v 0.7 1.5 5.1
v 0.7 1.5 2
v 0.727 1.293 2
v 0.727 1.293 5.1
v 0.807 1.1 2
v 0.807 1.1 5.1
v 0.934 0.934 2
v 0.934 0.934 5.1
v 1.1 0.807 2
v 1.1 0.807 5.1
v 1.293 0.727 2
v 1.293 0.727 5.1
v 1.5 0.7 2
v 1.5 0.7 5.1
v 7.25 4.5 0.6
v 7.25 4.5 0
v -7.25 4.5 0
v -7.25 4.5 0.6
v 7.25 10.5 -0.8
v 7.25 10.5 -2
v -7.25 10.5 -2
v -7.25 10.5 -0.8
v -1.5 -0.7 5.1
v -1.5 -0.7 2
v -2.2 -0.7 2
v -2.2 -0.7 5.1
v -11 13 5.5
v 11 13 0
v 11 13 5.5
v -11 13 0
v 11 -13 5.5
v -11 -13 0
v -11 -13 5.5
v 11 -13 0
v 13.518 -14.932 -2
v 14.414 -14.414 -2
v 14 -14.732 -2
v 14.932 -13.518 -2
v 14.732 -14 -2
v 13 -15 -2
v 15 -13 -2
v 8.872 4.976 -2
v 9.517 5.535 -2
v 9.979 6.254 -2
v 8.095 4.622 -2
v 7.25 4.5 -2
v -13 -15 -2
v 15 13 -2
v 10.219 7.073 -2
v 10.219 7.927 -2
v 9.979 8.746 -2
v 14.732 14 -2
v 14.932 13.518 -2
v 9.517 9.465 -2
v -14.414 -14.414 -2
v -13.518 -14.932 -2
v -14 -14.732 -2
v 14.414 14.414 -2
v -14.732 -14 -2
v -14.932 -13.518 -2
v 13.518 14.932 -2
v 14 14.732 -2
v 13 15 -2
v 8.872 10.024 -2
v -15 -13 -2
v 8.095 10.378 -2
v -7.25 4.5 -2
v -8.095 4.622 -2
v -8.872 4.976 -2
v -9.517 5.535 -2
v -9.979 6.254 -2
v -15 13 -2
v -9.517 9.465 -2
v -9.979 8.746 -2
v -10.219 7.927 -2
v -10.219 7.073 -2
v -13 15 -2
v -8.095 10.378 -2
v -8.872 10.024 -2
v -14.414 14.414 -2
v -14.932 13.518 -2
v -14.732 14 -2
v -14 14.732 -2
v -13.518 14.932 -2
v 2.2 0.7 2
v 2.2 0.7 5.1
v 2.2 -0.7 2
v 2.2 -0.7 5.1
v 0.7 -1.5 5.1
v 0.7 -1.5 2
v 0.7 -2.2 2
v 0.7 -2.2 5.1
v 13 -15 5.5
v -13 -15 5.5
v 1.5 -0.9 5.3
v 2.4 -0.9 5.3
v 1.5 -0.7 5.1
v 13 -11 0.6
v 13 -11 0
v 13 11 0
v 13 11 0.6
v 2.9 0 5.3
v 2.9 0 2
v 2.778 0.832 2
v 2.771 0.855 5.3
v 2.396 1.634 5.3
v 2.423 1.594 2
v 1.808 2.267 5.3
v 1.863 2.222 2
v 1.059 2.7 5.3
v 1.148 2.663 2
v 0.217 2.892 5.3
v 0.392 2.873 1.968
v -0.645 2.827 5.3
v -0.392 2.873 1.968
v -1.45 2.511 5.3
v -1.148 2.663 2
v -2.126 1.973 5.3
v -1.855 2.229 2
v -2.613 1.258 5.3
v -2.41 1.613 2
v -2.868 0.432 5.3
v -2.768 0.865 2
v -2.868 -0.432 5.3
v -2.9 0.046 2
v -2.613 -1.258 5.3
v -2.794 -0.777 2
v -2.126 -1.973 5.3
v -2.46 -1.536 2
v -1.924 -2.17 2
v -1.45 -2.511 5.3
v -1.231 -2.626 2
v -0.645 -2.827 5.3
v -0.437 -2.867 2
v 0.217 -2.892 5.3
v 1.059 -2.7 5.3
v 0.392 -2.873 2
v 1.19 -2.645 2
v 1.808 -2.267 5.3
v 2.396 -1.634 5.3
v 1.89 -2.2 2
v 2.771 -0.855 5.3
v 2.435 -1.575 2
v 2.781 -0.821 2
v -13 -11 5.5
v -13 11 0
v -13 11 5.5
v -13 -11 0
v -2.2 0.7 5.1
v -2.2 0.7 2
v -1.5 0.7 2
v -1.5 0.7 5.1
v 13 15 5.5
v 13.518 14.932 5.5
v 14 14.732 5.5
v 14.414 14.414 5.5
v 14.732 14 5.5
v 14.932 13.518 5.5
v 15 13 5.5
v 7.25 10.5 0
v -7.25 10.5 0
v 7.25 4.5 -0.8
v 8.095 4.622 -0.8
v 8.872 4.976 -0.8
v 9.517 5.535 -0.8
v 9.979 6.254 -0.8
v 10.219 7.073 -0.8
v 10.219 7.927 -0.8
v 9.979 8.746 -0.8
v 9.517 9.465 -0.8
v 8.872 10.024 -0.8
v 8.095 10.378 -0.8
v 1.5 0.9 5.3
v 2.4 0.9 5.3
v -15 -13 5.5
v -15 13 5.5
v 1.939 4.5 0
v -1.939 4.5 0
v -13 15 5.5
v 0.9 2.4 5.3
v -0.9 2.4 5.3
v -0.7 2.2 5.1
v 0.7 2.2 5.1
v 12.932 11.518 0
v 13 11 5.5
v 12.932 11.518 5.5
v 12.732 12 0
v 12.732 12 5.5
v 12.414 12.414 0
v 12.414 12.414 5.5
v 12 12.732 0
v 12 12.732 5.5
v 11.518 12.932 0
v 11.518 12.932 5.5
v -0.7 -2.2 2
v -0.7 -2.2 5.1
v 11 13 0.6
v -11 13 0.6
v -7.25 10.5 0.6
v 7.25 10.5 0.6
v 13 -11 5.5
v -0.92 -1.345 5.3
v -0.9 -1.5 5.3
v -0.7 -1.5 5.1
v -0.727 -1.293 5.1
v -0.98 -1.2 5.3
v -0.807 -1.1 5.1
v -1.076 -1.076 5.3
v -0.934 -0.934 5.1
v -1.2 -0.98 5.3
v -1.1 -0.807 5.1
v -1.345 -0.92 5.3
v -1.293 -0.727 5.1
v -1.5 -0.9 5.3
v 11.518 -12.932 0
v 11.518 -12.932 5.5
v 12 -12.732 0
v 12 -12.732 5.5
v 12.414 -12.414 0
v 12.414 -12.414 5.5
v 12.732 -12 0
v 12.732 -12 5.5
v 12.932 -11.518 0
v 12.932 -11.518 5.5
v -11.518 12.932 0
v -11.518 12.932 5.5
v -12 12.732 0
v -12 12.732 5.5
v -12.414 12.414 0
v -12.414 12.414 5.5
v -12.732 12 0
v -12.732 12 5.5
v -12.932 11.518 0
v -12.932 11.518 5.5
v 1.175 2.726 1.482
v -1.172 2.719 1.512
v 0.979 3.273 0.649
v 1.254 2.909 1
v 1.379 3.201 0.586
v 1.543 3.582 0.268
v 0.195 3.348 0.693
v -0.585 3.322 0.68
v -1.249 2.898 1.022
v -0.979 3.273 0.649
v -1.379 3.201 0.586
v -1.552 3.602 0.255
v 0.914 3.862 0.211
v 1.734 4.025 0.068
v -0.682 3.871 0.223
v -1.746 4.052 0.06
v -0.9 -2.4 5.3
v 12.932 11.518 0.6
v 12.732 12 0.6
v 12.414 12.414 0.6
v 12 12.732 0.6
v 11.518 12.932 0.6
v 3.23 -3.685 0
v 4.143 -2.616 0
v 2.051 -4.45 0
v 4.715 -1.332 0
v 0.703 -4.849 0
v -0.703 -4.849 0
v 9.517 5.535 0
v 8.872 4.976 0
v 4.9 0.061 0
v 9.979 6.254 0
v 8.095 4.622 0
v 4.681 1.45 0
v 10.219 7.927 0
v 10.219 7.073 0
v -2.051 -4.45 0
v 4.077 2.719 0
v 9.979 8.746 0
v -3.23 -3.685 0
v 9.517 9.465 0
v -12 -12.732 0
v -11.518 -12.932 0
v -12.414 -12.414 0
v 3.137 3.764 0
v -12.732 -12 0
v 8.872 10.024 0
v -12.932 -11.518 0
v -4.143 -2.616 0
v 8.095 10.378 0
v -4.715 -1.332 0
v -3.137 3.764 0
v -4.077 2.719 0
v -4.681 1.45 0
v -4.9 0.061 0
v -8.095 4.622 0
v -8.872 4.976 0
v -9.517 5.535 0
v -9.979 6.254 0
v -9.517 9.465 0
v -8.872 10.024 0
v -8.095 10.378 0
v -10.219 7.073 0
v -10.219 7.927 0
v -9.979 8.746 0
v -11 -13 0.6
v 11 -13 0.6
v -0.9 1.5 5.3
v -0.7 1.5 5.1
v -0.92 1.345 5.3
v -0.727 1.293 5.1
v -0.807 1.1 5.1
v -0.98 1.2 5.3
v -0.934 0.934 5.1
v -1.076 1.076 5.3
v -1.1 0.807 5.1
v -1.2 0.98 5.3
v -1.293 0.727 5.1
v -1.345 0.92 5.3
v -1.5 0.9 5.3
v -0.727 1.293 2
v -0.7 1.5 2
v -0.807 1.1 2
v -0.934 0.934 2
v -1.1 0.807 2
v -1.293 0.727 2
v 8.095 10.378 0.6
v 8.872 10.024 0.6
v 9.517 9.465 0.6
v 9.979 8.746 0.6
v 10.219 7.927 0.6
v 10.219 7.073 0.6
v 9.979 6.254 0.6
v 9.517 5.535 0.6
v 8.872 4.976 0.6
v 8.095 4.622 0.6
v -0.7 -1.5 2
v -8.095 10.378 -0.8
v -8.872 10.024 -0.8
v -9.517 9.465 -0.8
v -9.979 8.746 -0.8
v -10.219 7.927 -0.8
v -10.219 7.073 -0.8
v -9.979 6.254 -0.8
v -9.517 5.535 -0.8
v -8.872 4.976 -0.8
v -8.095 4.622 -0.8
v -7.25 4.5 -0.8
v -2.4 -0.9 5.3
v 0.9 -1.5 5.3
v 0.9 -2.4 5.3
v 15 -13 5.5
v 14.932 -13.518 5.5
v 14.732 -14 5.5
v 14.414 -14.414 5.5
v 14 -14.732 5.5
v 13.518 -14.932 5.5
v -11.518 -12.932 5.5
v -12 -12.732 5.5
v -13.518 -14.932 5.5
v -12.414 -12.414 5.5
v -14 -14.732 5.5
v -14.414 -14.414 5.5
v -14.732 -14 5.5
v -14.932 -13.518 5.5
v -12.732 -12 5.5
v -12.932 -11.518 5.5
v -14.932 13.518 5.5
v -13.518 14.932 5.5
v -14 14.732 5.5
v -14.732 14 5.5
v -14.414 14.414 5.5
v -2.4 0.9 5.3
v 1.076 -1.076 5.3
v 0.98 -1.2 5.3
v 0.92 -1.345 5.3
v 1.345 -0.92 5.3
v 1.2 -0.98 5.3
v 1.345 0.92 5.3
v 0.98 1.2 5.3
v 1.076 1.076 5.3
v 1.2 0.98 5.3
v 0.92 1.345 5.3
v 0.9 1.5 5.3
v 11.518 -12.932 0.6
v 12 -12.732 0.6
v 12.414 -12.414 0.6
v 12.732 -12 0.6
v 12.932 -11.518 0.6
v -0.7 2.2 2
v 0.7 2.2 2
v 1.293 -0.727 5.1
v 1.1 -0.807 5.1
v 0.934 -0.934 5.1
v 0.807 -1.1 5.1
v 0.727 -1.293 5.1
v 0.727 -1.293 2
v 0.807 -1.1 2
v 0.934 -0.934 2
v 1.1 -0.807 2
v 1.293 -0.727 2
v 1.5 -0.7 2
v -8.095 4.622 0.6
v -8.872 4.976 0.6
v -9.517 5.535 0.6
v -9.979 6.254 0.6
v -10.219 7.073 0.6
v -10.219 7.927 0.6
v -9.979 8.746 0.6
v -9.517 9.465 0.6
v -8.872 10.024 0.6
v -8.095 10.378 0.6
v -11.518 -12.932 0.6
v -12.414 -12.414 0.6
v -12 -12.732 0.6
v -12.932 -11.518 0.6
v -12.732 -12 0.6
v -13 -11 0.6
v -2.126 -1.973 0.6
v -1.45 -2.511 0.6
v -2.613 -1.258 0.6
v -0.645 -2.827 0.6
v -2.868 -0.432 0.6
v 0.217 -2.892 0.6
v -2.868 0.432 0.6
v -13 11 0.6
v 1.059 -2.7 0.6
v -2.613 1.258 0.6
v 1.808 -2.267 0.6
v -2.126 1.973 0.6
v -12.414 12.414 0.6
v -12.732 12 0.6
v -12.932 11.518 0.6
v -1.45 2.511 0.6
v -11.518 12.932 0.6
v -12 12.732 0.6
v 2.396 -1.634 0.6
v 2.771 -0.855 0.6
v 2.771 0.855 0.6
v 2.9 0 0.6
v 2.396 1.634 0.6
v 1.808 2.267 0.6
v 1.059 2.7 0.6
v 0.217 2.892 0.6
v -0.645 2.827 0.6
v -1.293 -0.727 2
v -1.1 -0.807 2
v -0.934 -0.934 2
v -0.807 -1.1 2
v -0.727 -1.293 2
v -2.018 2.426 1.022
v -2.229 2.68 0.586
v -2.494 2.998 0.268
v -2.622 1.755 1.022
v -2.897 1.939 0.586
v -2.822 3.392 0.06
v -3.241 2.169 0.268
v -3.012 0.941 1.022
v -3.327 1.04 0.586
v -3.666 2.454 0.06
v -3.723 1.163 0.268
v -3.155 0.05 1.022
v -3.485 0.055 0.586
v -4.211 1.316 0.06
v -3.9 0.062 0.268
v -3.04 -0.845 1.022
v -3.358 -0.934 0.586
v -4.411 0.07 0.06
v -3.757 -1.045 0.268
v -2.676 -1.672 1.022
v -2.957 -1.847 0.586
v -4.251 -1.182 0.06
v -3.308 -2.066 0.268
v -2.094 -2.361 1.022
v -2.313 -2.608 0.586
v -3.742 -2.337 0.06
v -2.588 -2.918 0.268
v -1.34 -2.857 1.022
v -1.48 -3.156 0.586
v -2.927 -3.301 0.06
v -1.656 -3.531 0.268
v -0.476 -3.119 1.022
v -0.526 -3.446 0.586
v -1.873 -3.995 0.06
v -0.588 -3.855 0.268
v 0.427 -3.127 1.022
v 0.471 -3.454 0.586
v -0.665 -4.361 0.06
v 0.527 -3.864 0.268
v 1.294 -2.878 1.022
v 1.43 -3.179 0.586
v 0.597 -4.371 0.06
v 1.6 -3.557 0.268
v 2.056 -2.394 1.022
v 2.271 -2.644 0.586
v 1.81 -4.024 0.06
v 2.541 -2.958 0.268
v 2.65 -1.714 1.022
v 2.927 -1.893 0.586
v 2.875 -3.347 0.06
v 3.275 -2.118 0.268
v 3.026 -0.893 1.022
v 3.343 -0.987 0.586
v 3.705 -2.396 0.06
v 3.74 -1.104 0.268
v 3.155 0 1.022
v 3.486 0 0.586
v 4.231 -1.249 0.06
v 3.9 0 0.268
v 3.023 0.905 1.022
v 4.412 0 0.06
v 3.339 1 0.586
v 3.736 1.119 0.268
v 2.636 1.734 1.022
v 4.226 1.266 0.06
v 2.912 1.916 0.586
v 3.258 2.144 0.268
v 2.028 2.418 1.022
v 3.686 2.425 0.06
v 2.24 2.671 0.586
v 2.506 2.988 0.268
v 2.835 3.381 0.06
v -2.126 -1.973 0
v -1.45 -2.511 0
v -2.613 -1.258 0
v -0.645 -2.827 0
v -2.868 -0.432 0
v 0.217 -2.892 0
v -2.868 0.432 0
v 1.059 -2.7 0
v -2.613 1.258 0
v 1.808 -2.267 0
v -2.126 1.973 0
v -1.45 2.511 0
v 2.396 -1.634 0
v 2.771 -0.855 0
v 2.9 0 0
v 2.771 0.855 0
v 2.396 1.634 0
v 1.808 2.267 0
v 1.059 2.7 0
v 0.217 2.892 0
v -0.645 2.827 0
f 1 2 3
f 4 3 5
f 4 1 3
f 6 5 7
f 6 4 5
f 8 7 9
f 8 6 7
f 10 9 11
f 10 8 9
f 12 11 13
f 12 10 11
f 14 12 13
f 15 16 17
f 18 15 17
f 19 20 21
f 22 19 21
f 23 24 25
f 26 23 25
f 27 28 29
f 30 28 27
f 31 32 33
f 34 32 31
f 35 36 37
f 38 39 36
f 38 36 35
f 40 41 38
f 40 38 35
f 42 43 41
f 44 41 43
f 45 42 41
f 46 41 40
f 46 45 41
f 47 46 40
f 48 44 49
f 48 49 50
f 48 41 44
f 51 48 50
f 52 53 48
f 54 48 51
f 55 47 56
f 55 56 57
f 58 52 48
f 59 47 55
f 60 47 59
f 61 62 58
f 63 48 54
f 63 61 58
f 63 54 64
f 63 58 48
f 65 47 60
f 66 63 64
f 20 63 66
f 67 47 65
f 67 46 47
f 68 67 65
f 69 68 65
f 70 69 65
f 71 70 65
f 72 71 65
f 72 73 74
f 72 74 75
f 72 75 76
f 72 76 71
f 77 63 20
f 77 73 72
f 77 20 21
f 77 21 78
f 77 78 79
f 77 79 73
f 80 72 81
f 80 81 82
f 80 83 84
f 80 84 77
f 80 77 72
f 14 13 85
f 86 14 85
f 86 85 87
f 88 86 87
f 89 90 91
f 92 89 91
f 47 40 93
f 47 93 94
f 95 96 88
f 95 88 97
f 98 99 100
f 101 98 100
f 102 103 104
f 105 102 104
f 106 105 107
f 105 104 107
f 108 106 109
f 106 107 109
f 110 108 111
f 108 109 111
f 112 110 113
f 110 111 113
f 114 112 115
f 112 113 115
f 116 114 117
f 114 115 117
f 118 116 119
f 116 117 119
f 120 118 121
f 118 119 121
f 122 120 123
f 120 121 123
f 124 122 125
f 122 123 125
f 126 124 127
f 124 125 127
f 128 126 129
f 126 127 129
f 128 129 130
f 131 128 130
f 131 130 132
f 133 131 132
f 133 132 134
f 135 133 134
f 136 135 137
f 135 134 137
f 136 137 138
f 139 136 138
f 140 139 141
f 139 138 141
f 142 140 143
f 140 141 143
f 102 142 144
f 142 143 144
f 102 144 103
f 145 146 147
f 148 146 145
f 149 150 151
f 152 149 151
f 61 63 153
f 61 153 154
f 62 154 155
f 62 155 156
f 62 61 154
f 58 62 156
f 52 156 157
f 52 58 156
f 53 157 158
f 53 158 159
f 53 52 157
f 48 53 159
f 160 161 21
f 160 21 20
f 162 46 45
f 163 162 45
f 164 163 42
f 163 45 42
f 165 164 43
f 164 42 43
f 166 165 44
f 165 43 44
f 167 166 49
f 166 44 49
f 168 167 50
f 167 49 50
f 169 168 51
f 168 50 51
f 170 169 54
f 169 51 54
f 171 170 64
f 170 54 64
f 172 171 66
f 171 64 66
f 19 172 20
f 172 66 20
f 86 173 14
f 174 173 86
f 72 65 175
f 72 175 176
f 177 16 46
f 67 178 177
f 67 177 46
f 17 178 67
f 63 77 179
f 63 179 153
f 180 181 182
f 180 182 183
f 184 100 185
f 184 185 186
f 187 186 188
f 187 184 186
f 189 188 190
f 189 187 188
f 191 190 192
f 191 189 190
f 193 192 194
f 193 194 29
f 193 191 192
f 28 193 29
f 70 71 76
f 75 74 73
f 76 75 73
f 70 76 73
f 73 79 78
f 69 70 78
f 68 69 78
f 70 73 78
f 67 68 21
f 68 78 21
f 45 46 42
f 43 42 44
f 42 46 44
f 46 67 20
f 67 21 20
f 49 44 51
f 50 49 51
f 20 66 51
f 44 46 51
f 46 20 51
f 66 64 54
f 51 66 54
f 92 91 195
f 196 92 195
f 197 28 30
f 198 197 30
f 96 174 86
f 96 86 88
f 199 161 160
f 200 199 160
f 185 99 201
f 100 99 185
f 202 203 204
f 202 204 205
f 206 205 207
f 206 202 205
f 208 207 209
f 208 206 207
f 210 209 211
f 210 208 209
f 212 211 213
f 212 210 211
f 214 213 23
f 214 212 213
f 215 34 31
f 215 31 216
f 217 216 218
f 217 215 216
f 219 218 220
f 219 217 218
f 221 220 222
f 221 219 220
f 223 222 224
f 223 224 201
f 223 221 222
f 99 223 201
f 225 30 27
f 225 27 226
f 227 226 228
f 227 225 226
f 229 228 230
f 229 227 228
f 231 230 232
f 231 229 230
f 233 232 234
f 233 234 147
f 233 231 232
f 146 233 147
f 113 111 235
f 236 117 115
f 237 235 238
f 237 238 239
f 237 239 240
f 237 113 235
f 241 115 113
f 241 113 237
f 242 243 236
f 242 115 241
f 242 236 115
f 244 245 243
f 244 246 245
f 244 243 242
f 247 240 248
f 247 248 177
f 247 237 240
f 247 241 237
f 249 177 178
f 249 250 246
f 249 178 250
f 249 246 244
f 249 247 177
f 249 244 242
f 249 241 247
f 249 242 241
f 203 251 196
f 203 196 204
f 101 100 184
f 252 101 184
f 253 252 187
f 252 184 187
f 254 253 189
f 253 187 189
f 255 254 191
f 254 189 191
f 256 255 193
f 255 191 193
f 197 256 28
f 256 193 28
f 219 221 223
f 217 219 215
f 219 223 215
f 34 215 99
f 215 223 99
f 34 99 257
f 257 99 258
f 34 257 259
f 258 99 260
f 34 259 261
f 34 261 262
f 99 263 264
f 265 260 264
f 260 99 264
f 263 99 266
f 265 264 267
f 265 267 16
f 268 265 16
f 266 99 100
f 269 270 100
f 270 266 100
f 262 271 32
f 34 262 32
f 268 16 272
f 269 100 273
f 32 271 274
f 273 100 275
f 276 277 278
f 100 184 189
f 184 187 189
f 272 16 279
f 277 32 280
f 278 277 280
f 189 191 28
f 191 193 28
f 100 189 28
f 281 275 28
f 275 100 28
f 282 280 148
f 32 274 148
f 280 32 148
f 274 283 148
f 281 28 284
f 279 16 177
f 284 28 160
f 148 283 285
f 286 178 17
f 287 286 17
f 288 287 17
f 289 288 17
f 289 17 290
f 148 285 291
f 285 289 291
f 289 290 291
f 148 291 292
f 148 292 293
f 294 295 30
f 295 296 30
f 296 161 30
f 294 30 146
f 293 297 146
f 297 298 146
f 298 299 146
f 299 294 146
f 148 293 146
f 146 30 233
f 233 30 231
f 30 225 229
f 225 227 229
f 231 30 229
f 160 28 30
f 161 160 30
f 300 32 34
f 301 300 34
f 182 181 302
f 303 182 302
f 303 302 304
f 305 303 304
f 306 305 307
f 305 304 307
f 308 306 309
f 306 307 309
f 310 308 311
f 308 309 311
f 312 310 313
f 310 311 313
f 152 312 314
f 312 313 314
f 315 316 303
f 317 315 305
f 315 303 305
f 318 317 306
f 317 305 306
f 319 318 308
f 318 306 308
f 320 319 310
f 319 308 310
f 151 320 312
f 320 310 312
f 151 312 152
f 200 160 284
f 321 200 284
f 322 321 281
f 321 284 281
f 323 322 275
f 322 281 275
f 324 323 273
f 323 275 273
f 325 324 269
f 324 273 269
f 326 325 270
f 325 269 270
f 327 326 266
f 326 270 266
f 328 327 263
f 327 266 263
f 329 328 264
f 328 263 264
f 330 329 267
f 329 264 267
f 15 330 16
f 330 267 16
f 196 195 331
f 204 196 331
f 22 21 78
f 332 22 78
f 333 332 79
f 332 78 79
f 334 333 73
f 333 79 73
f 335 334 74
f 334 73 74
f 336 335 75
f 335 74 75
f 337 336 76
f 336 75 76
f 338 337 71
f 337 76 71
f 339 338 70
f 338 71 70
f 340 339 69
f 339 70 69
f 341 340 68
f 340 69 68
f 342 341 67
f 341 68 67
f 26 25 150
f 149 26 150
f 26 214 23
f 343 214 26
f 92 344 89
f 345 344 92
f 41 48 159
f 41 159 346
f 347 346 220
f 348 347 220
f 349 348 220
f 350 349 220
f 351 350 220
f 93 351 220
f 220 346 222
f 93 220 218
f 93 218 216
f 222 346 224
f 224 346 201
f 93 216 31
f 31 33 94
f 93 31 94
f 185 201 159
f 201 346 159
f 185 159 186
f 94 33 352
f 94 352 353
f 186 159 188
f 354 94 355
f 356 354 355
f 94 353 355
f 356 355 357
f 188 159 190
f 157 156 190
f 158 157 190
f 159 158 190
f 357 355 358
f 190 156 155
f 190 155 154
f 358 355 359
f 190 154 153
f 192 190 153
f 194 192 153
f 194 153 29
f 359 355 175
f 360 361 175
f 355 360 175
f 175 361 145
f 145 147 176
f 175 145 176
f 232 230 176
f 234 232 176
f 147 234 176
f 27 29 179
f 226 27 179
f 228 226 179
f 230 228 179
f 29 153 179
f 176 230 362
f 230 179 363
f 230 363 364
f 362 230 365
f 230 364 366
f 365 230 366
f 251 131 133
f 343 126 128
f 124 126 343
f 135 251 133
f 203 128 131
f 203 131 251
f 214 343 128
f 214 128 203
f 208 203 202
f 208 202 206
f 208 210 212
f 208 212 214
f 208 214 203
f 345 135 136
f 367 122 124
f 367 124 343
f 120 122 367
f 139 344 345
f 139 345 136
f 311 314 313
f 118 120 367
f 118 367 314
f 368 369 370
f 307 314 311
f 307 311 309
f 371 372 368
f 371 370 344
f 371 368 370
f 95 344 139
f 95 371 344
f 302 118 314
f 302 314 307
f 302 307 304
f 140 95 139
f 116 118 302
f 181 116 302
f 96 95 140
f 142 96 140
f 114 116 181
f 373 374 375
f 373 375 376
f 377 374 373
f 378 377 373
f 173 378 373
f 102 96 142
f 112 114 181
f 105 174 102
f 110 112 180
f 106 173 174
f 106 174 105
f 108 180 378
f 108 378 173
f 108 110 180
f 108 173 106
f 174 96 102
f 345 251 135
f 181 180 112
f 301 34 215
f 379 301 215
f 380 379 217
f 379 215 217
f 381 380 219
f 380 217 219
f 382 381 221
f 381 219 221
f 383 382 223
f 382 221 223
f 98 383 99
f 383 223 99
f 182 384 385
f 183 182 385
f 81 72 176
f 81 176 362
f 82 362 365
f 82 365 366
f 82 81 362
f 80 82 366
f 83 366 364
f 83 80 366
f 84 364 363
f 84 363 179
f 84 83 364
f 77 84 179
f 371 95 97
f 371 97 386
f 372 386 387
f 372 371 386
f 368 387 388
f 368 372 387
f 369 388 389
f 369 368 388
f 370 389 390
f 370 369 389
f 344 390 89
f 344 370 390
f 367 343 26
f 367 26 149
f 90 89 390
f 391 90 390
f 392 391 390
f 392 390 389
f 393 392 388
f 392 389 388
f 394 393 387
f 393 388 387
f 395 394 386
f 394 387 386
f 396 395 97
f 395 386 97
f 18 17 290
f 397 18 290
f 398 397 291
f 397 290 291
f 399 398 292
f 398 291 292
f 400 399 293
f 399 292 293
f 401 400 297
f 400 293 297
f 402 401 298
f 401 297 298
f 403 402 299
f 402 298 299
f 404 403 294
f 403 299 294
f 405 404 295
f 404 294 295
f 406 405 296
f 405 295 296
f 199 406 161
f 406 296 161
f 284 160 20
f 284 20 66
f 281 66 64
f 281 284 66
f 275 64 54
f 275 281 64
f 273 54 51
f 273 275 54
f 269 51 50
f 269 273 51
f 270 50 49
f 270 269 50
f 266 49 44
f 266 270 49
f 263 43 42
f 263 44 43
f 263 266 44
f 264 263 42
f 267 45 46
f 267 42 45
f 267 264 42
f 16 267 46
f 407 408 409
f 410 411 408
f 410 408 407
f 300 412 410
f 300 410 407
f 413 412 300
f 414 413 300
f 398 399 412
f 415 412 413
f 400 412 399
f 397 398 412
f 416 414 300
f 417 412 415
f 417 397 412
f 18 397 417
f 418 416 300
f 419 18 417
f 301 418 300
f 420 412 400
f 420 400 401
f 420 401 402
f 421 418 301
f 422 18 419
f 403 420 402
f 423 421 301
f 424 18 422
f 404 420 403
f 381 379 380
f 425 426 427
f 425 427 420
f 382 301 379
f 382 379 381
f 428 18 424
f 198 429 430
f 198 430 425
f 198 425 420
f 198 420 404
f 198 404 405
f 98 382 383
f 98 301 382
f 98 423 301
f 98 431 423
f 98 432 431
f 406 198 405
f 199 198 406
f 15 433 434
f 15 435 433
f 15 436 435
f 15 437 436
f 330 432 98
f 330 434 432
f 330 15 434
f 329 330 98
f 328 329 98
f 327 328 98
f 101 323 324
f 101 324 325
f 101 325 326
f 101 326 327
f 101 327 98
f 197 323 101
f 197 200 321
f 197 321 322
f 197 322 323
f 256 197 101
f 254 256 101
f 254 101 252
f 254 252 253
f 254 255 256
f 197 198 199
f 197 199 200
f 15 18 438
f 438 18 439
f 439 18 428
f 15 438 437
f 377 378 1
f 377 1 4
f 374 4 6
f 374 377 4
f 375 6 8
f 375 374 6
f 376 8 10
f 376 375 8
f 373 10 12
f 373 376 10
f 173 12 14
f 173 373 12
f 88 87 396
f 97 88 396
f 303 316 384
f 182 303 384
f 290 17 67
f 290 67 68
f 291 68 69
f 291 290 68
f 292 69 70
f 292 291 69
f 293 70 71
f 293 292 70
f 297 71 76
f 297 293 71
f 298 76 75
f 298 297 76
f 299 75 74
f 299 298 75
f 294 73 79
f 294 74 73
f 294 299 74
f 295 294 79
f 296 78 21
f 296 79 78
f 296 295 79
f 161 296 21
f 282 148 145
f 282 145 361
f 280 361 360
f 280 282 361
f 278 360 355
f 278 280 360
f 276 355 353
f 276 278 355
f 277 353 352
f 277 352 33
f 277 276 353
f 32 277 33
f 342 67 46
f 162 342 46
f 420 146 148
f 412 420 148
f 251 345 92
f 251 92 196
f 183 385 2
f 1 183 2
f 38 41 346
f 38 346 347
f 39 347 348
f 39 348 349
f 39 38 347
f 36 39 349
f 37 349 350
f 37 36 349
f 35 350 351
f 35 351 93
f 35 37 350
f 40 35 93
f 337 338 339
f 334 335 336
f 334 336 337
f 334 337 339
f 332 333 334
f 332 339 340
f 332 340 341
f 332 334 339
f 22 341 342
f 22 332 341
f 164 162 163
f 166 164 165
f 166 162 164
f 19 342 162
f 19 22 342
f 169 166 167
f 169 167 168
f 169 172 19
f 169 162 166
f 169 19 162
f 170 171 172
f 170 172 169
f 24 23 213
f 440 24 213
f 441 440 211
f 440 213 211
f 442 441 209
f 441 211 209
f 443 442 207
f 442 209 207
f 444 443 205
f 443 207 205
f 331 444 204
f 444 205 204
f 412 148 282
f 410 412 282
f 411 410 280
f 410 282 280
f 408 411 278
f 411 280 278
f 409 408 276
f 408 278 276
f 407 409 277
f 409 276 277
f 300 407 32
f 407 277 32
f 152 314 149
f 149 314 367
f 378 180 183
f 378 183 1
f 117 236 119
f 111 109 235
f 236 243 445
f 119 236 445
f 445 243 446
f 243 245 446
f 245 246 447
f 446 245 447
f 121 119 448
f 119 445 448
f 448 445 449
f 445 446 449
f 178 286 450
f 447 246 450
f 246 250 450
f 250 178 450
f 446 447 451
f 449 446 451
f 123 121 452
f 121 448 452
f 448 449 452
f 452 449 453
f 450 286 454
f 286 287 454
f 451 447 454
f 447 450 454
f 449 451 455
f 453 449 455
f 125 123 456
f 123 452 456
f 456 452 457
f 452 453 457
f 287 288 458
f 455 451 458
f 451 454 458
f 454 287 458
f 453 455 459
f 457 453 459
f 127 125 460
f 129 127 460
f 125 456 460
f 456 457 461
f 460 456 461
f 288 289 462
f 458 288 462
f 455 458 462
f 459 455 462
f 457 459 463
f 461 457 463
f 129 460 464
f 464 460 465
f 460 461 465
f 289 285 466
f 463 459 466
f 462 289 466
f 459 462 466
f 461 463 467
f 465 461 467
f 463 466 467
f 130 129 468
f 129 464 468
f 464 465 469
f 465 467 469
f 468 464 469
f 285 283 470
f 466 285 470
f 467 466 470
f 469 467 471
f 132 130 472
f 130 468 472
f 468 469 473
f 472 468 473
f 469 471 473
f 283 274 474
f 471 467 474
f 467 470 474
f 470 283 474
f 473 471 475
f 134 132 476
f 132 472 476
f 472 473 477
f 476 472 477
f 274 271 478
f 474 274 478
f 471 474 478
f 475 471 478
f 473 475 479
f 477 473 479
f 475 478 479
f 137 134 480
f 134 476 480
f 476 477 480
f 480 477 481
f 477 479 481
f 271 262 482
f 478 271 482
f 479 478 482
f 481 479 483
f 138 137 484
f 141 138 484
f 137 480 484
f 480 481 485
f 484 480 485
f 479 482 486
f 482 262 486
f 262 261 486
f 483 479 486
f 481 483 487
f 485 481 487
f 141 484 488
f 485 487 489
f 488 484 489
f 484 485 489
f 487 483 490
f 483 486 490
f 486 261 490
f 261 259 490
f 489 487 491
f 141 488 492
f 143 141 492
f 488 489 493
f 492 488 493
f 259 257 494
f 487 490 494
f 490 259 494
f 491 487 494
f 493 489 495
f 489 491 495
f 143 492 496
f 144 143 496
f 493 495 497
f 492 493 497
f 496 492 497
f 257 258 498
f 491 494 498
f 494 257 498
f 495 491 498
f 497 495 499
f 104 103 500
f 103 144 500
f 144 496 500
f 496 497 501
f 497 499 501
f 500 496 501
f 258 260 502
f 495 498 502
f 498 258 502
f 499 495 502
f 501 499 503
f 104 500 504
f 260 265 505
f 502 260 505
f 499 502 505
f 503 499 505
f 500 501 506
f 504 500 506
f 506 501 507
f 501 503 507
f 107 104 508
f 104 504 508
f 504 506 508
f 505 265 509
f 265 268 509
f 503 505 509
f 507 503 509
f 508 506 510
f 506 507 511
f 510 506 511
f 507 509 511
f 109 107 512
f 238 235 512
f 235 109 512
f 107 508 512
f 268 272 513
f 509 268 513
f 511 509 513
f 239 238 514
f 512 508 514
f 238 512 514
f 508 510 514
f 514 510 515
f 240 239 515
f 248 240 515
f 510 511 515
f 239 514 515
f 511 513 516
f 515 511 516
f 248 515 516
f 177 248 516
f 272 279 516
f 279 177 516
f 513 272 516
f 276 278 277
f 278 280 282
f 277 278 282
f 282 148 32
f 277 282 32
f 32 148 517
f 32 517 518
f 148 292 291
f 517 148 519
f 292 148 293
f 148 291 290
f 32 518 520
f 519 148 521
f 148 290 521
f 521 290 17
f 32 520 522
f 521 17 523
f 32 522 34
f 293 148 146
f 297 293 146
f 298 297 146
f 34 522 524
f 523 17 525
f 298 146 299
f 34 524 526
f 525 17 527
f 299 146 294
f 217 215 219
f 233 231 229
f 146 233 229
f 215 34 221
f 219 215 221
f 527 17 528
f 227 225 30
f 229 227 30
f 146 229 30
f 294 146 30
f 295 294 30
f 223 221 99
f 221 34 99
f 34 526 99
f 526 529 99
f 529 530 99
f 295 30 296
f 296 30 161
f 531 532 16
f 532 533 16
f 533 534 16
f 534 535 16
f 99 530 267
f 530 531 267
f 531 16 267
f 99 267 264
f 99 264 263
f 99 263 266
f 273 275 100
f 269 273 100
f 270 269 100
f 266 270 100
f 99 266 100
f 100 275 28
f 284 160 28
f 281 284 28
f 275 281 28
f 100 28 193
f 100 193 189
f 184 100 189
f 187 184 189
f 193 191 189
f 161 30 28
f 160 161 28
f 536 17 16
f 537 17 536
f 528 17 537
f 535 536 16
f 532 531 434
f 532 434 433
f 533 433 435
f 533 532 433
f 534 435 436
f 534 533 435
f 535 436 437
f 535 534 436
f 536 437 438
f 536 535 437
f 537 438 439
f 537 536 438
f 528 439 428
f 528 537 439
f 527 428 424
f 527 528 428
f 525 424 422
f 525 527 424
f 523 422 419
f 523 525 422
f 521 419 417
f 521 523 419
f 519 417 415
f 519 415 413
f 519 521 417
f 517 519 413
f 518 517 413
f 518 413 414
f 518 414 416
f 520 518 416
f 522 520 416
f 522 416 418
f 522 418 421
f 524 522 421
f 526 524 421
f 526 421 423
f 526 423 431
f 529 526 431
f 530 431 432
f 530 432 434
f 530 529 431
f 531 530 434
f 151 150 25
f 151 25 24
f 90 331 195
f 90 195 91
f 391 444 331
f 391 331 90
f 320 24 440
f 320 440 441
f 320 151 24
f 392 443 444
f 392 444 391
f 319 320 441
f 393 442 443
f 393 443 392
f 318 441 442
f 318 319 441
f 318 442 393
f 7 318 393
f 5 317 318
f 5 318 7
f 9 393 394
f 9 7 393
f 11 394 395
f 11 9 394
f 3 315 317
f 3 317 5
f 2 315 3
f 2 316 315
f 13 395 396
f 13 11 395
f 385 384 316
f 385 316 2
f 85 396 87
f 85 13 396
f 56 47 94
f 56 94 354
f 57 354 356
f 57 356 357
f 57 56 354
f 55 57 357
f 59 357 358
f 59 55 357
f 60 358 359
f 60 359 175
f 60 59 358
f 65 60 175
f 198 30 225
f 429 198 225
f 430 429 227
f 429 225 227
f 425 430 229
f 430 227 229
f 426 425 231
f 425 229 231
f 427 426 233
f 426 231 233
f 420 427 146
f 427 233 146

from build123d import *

# Parameters (mm, degrees)
EXTRUDE_1_DEPTH     = 5.5
SKETCH_1_6_R        = 2.9
EXTRUDE_2_DEPTH     = 5.3
EXTRUDE_START       = -2
EXTRUDE_3_DEPTH     = 2
EXTRUDE_4_DEPTH     = 2
CUT_EXTRUDE_1_REACH = 23.915
EXTRUDE_6_DEPTH     = 1.2
SKETCH_7_R          = 2.9
EXTRUDE_7_DEPTH     = 0.6
FILLET_4_R          = 0.8
CHAMFER_1_SIZE      = 0.2
FILLET_5_R          = 2


with BuildPart() as part:
    # 草图1 → 凸台-拉伸1 (new body)
    with BuildSketch(Plane.XY):
        with BuildLine():
            ThreePointArc((-15, 13), (-14.414213562, 14.414213562), (-13, 15))
            Line((-13, 15), (13, 15))
            ThreePointArc((13, 15), (14.414213562, 14.414213562), (15, 13))
            Line((15, 13), (15, -13))
            ThreePointArc((15, -13), (14.414213562, -14.414213562), (13, -15))
            Line((13, -15), (-13, -15))
            ThreePointArc((-13, -15), (-14.414213562, -14.414213562), (-15, -13))
            Line((-15, -13), (-15, 13))
        make_face()
        with BuildLine():
            ThreePointArc((-13, -11), (-12.414213562, -12.414213562), (-11, -13))
            Line((-11, -13), (11, -13))
            ThreePointArc((11, -13), (12.414213562, -12.414213562), (13, -11))
            Line((13, -11), (13, 11))
            ThreePointArc((13, 11), (12.414213562, 12.414213562), (11, 13))
            Line((11, 13), (-11, 13))
            ThreePointArc((-11, 13), (-12.414213562, 12.414213562), (-13, 11))
            Line((-13, 11), (-13, -11))
        make_face(mode=Mode.SUBTRACT)
    extrude(amount=EXTRUDE_1_DEPTH)



with BuildPart() as body_2:
    # 草图1<6> → 凸台-拉伸2 (new body)
    with BuildSketch(Plane.XY):
        Circle(SKETCH_1_6_R)
        Polygon((-2.2, -0.7), (-2.2, 0.7), (-0.7, 0.7), (-0.7, 2.2), (0.7, 2.2), (0.7, 0.7), (2.2, 0.7), (2.2, -0.7), (0.7, -0.7), (0.7, -2.2), (-0.7, -2.2), (-0.7, -0.7), align=None, mode=Mode.SUBTRACT)
    extrude(amount=EXTRUDE_2_DEPTH)


with BuildPart() as part_1:
    add(part.part)

    add(body_2.part)  # 凸台-拉伸3 merges body 2
    # 草图1<7> → 凸台-拉伸3 (add)
    with BuildSketch(Plane.XY.offset(EXTRUDE_START)):
        with BuildLine():
            Line((-13, 15), (13, 15))
            ThreePointArc((13, 15), (14.414213562, 14.414213562), (15, 13))
            Line((15, 13), (15, -13))
            ThreePointArc((15, -13), (14.414213562, -14.414213562), (13, -15))
            Line((13, -15), (-13, -15))
            ThreePointArc((-13, -15), (-14.414213562, -14.414213562), (-15, -13))
            Line((-15, -13), (-15, 13))
            ThreePointArc((-15, 13), (-14.414213562, 14.414213562), (-13, 15))
        make_face()
    extrude(amount=EXTRUDE_3_DEPTH)

    # 草图3 → 凸台-拉伸4 (add)
    with BuildSketch(Plane.XY):
        Polygon((0.7, 0.7), (0.7, 2.2), (-0.7, 2.2), (-0.7, 0.7), (-2.2, 0.7), (-2.2, -0.7), (-0.7, -0.7), (-0.7, -2.2), (0.7, -2.2), (0.7, -0.7), (2.2, -0.7), (2.2, 0.7), align=None)
    extrude(amount=EXTRUDE_4_DEPTH)

    # 草图5 → 切除-拉伸1 (cut, up to next)
    with BuildSketch(Plane.XY, mode=Mode.PRIVATE) as cut_extrude_1_sk1:
        with BuildLine():
            Line((7.25, 4.5), (-7.25, 4.5))
            ThreePointArc((-7.25, 4.5), (-10.25, 7.5), (-7.25, 10.5))
            Line((-7.25, 10.5), (7.25, 10.5))
            ThreePointArc((7.25, 10.5), (10.25, 7.5), (7.25, 4.5))
        make_face()
    cut_extrude_1_tool1 = extrude(cut_extrude_1_sk1.sketch, amount=-CUT_EXTRUDE_1_REACH, mode=Mode.PRIVATE) & part_1.part
    add(cut_extrude_1_tool1.solids().sort_by_distance((0, 7.5, 0))[0], mode=Mode.SUBTRACT)

    # 圆角4
    fillet_4_edges = [part_1.edges().sort_by_distance(p)[0] for p in [
        (0.7, 0.7, 3.65),
        (0.7, -0.7, 3.65),
        (-0.7, -0.7, 3.65),
        (-0.7, 0.7, 3.65),
    ]]
    fillet(fillet_4_edges, radius=FILLET_4_R)

    # 倒角1
    chamfer_1_edges = [part_1.edges().sort_by_distance(p)[0] for p in [
        (1.85, 0.7, 5.3),
        (1.85, -0.7, 5.3),
        (0.7, -1.85, 5.3),
        (-0.7, -1.85, 5.3),
        (0.934314575, -0.934314575, 5.3),
        (-0.934314575, -0.934314575, 5.3),
        (0.934314575, 0.934314575, 5.3),
        (-0.934314575, 0.934314575, 5.3),
        (0, -2.2, 5.3),
        (-1.85, -0.7, 5.3),
        (-2.2, 0, 5.3),
        (-0.7, 1.85, 5.3),
        (0, 2.2, 5.3),
        (0.7, 1.85, 5.3),
        (2.2, 0, 5.3),
        (-1.85, 0.7, 5.3),
    ]]
    chamfer(chamfer_1_edges, length=CHAMFER_1_SIZE)

    # 圆角5
    fillet_5_edges = [part_1.edges().sort_by_distance(p)[0] for p in [
        (-2.9, 0, 0),
    ]]
    fillet(fillet_5_edges, radius=FILLET_5_R)


with BuildPart() as body_2_2:
    # 草图6 → 凸台-拉伸6 (new body)
    with BuildSketch(Plane(origin=(0, 0, -2), x_dir=(-1, 0, 0), z_dir=(0, 0, -1))):
        with BuildLine():
            Line((7.25, 4.5), (-7.25, 4.5))
            ThreePointArc((-7.25, 4.5), (-10.25, 7.5), (-7.25, 10.5))
            Line((-7.25, 10.5), (7.25, 10.5))
            ThreePointArc((7.25, 10.5), (10.25, 7.5), (7.25, 4.5))
        make_face()
    extrude(amount=-EXTRUDE_6_DEPTH)


with BuildPart() as body_3:
    # 草图7 → 凸台-拉伸7 (new body)
    with BuildSketch(Plane.XY):
        with BuildLine():
            Line((-13, 11), (-13, -11))
            ThreePointArc((-13, -11), (-12.414213562, -12.414213562), (-11, -13))
            Line((-11, -13), (11, -13))
            ThreePointArc((11, -13), (12.414213562, -12.414213562), (13, -11))
            Line((13, -11), (13, 11))
            ThreePointArc((13, 11), (12.414213562, 12.414213562), (11, 13))
            Line((11, 13), (-11, 13))
            ThreePointArc((-11, 13), (-12.414213562, 12.414213562), (-13, 11))
        make_face()
        Circle(SKETCH_7_R, mode=Mode.SUBTRACT)
        with BuildLine():
            Line((7.25, 4.5), (-7.25, 4.5))
            ThreePointArc((-7.25, 4.5), (-10.25, 7.5), (-7.25, 10.5))
            Line((-7.25, 10.5), (7.25, 10.5))
            ThreePointArc((7.25, 10.5), (10.25, 7.5), (7.25, 4.5))
        make_face(mode=Mode.SUBTRACT)
    extrude(amount=EXTRUDE_7_DEPTH)


solid = Compound([part_1.part, body_2_2.part, body_3.part])
